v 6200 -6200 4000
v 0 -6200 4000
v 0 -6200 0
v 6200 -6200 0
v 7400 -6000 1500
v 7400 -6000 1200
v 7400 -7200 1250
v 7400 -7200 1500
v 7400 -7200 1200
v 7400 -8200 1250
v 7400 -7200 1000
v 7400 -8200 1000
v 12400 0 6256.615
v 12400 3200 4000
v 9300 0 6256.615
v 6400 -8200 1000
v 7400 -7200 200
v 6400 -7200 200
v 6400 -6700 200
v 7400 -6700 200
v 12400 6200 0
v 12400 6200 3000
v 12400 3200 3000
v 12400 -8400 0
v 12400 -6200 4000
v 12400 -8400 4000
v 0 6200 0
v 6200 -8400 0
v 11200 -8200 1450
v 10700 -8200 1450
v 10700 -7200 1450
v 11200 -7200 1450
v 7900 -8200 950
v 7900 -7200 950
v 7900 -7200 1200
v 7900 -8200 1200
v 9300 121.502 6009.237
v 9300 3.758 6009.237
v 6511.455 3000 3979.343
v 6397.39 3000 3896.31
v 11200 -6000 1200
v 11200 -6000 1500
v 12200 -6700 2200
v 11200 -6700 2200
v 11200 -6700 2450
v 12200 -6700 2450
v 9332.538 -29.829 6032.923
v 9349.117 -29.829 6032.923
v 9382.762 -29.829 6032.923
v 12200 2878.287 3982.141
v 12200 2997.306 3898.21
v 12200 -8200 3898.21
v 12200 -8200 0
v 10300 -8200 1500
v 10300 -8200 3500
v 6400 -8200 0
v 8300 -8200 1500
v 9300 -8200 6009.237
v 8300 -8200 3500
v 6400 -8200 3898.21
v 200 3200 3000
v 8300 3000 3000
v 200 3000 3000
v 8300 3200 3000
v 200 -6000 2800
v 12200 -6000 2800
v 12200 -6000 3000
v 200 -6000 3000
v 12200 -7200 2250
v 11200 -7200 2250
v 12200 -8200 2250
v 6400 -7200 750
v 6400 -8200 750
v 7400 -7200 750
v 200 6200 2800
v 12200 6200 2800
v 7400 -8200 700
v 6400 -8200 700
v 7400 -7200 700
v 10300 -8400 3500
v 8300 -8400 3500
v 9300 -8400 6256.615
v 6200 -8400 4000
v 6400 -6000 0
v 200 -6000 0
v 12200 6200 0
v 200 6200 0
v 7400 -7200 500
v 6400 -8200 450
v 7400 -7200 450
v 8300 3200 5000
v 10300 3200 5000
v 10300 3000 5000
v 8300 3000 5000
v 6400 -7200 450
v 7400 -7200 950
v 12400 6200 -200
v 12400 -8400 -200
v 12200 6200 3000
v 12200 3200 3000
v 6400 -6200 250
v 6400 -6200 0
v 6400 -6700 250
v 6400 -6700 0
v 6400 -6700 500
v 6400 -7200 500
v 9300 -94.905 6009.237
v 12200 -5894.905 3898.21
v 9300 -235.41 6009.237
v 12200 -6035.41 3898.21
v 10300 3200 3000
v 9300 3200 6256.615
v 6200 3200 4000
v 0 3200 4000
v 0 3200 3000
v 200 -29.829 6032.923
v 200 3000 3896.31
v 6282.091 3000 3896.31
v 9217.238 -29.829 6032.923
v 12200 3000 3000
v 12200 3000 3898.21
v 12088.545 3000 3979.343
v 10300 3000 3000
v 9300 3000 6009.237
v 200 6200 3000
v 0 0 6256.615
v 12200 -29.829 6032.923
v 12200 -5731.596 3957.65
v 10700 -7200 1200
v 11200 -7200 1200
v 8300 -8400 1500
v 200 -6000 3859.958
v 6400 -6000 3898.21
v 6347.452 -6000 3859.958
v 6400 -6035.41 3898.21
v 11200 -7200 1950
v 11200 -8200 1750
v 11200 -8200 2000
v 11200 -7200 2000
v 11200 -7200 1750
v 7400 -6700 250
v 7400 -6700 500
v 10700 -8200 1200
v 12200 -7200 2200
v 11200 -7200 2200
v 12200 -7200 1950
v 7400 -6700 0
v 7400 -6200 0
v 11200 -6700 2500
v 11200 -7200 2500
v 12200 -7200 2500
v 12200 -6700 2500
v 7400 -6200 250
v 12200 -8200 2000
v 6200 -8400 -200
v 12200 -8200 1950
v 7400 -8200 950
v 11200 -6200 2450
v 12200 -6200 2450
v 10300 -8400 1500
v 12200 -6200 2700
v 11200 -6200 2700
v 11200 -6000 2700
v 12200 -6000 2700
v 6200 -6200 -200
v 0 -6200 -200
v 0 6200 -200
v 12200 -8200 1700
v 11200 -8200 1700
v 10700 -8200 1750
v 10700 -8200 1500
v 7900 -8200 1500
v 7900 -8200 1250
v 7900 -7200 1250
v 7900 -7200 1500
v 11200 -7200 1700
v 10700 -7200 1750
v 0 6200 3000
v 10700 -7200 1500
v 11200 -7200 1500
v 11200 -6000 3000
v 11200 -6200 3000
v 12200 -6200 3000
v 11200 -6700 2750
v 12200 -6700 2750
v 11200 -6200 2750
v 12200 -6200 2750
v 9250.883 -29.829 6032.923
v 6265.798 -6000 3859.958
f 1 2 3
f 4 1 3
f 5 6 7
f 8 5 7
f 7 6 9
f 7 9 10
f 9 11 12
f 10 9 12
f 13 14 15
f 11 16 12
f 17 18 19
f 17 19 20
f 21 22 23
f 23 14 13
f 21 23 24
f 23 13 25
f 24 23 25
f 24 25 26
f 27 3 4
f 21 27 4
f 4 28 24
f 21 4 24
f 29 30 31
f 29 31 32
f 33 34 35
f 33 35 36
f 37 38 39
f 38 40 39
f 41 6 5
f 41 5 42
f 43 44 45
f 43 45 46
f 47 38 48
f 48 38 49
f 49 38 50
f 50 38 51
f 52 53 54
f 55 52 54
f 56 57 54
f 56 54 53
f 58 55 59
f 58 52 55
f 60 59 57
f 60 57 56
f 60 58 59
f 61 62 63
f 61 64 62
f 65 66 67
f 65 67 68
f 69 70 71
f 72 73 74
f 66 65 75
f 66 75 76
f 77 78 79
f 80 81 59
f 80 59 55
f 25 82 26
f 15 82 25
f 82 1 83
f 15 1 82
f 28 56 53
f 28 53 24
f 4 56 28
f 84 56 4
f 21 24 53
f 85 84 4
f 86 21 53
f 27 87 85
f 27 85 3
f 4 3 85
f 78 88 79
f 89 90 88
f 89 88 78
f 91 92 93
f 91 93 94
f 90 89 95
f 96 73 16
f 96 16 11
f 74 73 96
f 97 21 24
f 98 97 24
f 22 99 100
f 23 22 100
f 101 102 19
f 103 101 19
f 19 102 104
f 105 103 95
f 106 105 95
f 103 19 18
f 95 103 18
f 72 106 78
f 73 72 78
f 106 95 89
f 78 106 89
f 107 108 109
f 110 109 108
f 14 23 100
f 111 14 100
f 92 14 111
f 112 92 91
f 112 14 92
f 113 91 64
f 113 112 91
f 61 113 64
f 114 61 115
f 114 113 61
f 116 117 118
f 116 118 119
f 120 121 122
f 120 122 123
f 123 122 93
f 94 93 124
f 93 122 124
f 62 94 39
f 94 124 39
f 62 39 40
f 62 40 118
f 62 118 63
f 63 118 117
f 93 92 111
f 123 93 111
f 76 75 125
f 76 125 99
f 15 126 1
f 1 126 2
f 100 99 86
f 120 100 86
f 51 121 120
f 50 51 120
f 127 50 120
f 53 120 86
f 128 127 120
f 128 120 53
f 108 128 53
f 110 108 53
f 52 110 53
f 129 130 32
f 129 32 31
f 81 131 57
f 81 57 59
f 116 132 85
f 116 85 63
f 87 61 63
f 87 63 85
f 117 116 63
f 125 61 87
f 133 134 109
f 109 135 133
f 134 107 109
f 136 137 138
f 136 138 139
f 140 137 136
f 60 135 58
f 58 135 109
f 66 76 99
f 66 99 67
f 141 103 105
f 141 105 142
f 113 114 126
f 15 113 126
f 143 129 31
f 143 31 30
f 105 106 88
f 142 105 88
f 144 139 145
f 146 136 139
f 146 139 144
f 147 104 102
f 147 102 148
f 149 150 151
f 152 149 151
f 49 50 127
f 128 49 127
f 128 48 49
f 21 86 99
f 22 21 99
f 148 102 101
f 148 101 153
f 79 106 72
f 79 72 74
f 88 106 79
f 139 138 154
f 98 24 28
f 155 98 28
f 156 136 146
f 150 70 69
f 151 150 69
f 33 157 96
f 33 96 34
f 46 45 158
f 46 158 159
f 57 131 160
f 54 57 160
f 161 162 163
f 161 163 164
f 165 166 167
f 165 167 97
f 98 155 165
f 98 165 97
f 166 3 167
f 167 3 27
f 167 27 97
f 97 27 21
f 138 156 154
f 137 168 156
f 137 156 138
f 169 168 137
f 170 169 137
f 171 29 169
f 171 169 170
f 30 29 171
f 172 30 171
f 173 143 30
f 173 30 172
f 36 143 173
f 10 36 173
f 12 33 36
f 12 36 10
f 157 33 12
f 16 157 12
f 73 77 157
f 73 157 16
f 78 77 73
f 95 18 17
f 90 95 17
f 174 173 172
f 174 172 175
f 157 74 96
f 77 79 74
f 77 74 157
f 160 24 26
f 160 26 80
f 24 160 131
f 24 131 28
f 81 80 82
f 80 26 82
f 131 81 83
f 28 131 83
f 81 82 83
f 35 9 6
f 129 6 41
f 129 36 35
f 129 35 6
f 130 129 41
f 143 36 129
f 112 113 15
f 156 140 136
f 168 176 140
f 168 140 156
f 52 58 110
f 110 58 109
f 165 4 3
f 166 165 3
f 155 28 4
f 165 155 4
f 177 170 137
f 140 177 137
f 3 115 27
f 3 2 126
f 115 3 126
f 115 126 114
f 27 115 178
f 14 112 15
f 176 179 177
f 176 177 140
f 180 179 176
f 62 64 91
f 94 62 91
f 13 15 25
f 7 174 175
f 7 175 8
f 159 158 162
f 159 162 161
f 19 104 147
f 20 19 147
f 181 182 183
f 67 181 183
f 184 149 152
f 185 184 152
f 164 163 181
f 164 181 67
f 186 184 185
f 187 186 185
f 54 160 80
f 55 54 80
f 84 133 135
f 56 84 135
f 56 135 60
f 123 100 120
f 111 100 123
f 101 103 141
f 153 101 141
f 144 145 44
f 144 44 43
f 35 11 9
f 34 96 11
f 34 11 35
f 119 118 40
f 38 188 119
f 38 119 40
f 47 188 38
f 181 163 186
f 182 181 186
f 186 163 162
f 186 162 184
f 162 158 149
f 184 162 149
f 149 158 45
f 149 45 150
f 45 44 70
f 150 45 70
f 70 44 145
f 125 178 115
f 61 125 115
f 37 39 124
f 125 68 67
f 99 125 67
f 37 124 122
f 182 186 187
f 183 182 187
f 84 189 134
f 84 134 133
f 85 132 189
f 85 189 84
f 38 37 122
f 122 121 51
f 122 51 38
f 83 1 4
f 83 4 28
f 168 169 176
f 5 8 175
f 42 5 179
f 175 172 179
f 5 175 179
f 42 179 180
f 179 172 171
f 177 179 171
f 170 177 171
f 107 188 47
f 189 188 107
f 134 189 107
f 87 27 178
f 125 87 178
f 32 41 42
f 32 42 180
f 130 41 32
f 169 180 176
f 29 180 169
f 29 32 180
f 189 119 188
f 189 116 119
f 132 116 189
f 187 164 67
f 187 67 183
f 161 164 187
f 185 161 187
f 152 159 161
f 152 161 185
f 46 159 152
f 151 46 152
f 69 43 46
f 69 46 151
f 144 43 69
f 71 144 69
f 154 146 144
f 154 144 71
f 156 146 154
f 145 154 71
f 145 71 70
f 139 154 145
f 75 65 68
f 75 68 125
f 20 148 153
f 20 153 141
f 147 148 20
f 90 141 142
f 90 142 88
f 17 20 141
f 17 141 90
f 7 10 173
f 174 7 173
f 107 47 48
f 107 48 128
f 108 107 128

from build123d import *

# Parameters (mm, degrees)
F14_DEPTH    = 12400
F15_W        = 2000
F15_H        = 1000
F0_DEPTH     = 11600
F16_DEPTH    = 4000
F1_T         = 200
F1_T3_DEPTH  = 7689.8774544047
F1_T5_DEPTH  = 5394.2279984236
F1_T7_DEPTH  = 5394.2279984236
F1_T9_DEPTH  = 7689.8774544047
F1_T11_DEPTH = 4400
F2_W         = 2000
F2_H         = 2000
F17_DEPTH    = 2400
F18_DEPTH    = 200
F3_W         = 1000
F3_H         = 500
F3_W_2       = 500
F3_H_2       = 1000
F3_H_3       = 200
F4_DEPTH     = 200
F5_START     = -2800
F5_DEPTH     = 200
F6_START     = -1200
F6_DEPTH     = 300
F7_START     = -1450
F7_DEPTH     = 300
F19_START    = -1700
F19_DEPTH    = 300
F20_START    = -1950
F20_DEPTH    = 300
F21_START    = -2200
F21_DEPTH    = 300
F8_START     = -2450
F8_DEPTH     = 300
F22_START    = -2700
F22_DEPTH    = 300
F9_START     = -950
F9_DEPTH     = 300
F10_START    = -700
F10_DEPTH    = 300
F11_START    = -450
F11_DEPTH    = 300
F23_START    = -200
F23_DEPTH    = 300
F12_DEPTH    = 250


# Not quite as in the source:
# - an extrude ends at something that could not be found from the text; its depth is read off the source's solid
# - a shell that OpenCascade refuses in one call is made with other operations: the cavity is built on its own and cut out


with BuildPart() as f14:
    # F13 (on Right) → F14 (new body)
    with BuildSketch(Plane.YZ):
        Polygon((-6200, 0), (6200, 0), (6200, 3000), (3200, 3000), (3200, 4000), (0, 6256.6154524505), (-6200, 4000), align=None)
    extrude(amount=F14_DEPTH)

    # F15 (on face) → F0 (join)
    with BuildSketch(Plane(origin=(0, 3200, 0), x_dir=(-1, 0, 0), z_dir=(0, 1, 0))):
        Polygon((-9300, 6256.6154524505), (-12400, 4000), (-10300, 4000), (-10300, 5000), (-8300, 5000), (-8300, 4000), (-6200, 4000), align=None)
        with Locations((-9300, 4500)):
            Rectangle(F15_W, F15_H)
    extrude(amount=-F0_DEPTH)

    # F16 (add, through all): a face of the model
    f16_faces = [f14.faces().sort_by_distance(p)[0] for p in [
        (9300, -7300, 4000),
    ]]
    extrude(f16_faces, amount=F16_DEPTH)

    # F1: shell of thickness 200, made by hand


with BuildPart() as f1_core1:
    # F1_t2: copy of F14
    add(f14.part)

    # the walls: a layer under each face that stays
    f1_faces = [f1_core1.faces().sort_by_distance(p)[0] for p in [
        (4650, -3100, 5128.3077262252),
        (4650, 1600, 5128.3077262252),
        (10333.3333333333, 3200, 3542.7692420751),
        (9816.6666666667, 1600, 5880.512877042),
        (11883.3333333333, 1600, 5128.3077262252),
        (11883.3333333333, -1033.3333333333, 5880.512877042),
        (10850, -4200, 5128.3077262252),
        (9300, -8400, 3128.3077262252),
        (6200, -7300, 2000),
        (12400, -1100, 3128.3077262252),
        (7750, 2666.6666666667, 5128.3077262252),
        (7750, -4200, 5128.3077262252),
        (3100, -6200, 2000),
        (0, 0, 3128.3077262252),
    ]]
    thicken(f1_faces, amount=-F1_T, mode=Mode.SUBTRACT)

    # F1_s4 → F1_t3 (cut)
    with BuildSketch(Plane(origin=(-679.6785869535, -1359.357173907, -494.7655490384), x_dir=(-0.894427191, 0.4472135955, 0), z_dir=(0.4252472033, 0.8504944066, 0.3095546484))):
        Polygon((-8317.4260033625, 4665.513258174), (-8287.5816646932, 4464.1897106586), (-8360.6155438547, 4452.8857222652), (-8423.4513815758, 4491.7879735735), align=None)
    extrude(amount=F1_T3_DEPTH, mode=Mode.SUBTRACT)

    # F1_s6 → F1_t5 (cut)
    with BuildSketch(Plane(origin=(5462.1086087811, -5638.3056606773, 3976.089899851), x_dir=(-0.7182402228, -0.6957952158, 0), z_dir=(-0.6207165554, 0.6407396701, -0.4518447002))):
        Polygon((-6679.5906506398, 2661.3103147543), (-6599.4357743978, 2474.4492579485), (-6682.2486847174, 2438.2000137734), (-6764.1744994282, 2476.4118797687), align=None)
    extrude(amount=F1_T5_DEPTH, mode=Mode.SUBTRACT)

    # F1_s8 → F1_t7 (cut)
    with BuildSketch(Plane(origin=(5052.5541970253, 5215.5398162841, -3677.9586694679), x_dir=(0.7182402228, -0.6957952158, 0), z_dir=(-0.6207165554, -0.6407396701, 0.4518447002))):
        Polygon((6679.6774932388, 8508.9899951089), (6595.0936444505, 8324.0915601233), (6677.0194591612, 8285.8796941281), (6759.8323694808, 8322.1289383031), align=None)
    extrude(amount=F1_T7_DEPTH, mode=Mode.SUBTRACT)

    # F1_s10 → F1_t9 (cut)
    with BuildSketch(Plane(origin=(773.1141266852, -1546.2282533704, -562.7810596082), x_dir=(0.894427191, 0.4472135955, 0), z_dir=(0.4252472033, -0.8504944066, -0.3095546484))):
        Polygon((8318.9197492359, 7240.4423384247), (8348.7640879052, 7039.1187909094), (8275.7302087437, 7027.8148025159), (8212.8943710226, 7066.7170538243), align=None)
    extrude(amount=F1_T9_DEPTH, mode=Mode.SUBTRACT)

    # F1_s12 → F1_t11 (cut)
    with BuildSketch(Plane.XY.offset(-200)):
        Polygon((6198, -6202), (6400, -6200), (6400, -6000), (6200, -6000), align=None)
    extrude(amount=F1_T11_DEPTH, mode=Mode.SUBTRACT)


with BuildPart() as f14_1:
    add(f14.part)

    # what is left inside the walls is the cavity
    f1_cavity = [f1_core1.part.solids().sort_by_distance(p)[0] for p in [
        (8200, -1000, 2),
    ]]
    add(f1_cavity, mode=Mode.SUBTRACT)

    # F2 (on face) → F17 (cut, through all)
    with BuildSketch(Plane.XZ.offset(8400)):
        with Locations((9300, 2500)):
            Rectangle(F2_W, F2_H)
    extrude(amount=-F17_DEPTH, mode=Mode.SUBTRACT)

    # F15 (on face) → F18 (cut, through all)
    with BuildSketch(Plane(origin=(0, 3200, 0), x_dir=(-1, 0, 0), z_dir=(0, 1, 0))):
        with Locations((-9300, 3500)):
            Rectangle(F15_W, F15_H)
        with Locations((-9300, 4500)):
            Rectangle(F15_W, F15_H)
    extrude(amount=-F18_DEPTH, mode=Mode.SUBTRACT)


with BuildPart() as f4:
    # F3 (on face) → F4 (new body)
    with BuildSketch(Plane(origin=(0, 0, 0), x_dir=(1, 0, 0), z_dir=(0, 0, -1))):
        Polygon((200, 6000), (6400, 6000), (6400, 6200), (6400, 6700), (6400, 7200), (6400, 8200), (7400, 8200), (7900, 8200), (10700, 8200), (11200, 8200), (12200, 8200), (12200, 7200), (12200, 6700), (12200, 6200), (12200, 6000), (12200, -6200), (12400, -6200), (12400, 8400), (6200, 8400), (6200, 6200), (0, 6200), (0, -6200), (200, -6200), align=None)
        Polygon((7400, 6000), (6400, 6000), (200, 6000), (200, -6200), (12200, -6200), (12200, 6000), (11200, 6000), align=None)
        Polygon((6400, 8200), (6400, 7200), (7400, 7200), align=None)
        with Locations((6900, 6950)):
            Rectangle(F3_W, F3_H)
        Polygon((7400, 8200), (6400, 8200), (7400, 7200), align=None)
        with Locations((7650, 7700)):
            Rectangle(F3_W_2, F3_H_2)
        Polygon((7400, 6200), (7400, 6000), (11200, 6000), (11200, 6200), (11200, 6700), (11200, 7200), (10700, 7200), (10700, 8200), (7900, 8200), (7900, 7200), (7400, 7200), (7400, 6700), align=None)
        with Locations((6900, 6450)):
            Rectangle(F3_W, F3_H)
        with Locations((6900, 6100)):
            Rectangle(F3_W, F3_H_3)
        with Locations((11700, 6100)):
            Rectangle(F3_W, F3_H_3)
        with Locations((11700, 6450)):
            Rectangle(F3_W, F3_H)
        with Locations((11700, 6950)):
            Rectangle(F3_W, F3_H)
        Polygon((12200, 8200), (11200, 7200), (12200, 7200), align=None)
        Polygon((11200, 8200), (11200, 7200), (12200, 8200), align=None)
        with Locations((10950, 7700)):
            Rectangle(F3_W_2, F3_H_2)
    extrude(amount=F4_DEPTH)


with BuildPart() as f5:
    # F3 (on face) → F5 (new body)
    with BuildSketch(Plane(origin=(0, 0, 0), x_dir=(1, 0, 0), z_dir=(0, 0, -1)).offset(F5_START)):
        Polygon((7400, 6000), (6400, 6000), (200, 6000), (200, -6200), (12200, -6200), (12200, 6000), (11200, 6000), align=None)
    extrude(amount=-F5_DEPTH)


with BuildPart() as f6:
    # F3 (on face) → F6 (new body)
    with BuildSketch(Plane(origin=(0, 0, 0), x_dir=(1, 0, 0), z_dir=(0, 0, -1)).offset(F6_START)):
        Polygon((7400, 6200), (7400, 6000), (11200, 6000), (11200, 6200), (11200, 6700), (11200, 7200), (10700, 7200), (10700, 8200), (7900, 8200), (7900, 7200), (7400, 7200), (7400, 6700), align=None)
    extrude(amount=-F6_DEPTH)

    # F3 (on face) → F7 (join)
    with BuildSketch(Plane(origin=(0, 0, 0), x_dir=(1, 0, 0), z_dir=(0, 0, -1)).offset(F7_START)):
        with Locations((10950, 7700)):
            Rectangle(F3_W_2, F3_H_2)
    extrude(amount=-F7_DEPTH)

    # F3 (on face) → F19 (join)
    with BuildSketch(Plane(origin=(0, 0, 0), x_dir=(1, 0, 0), z_dir=(0, 0, -1)).offset(F19_START)):
        Polygon((11200, 8200), (11200, 7200), (12200, 8200), align=None)
    extrude(amount=-F19_DEPTH)

    # F3 (on face) → F20 (join)
    with BuildSketch(Plane(origin=(0, 0, 0), x_dir=(1, 0, 0), z_dir=(0, 0, -1)).offset(F20_START)):
        Polygon((12200, 8200), (11200, 7200), (12200, 7200), align=None)
    extrude(amount=-F20_DEPTH)

    # F3 (on face) → F21 (join)
    with BuildSketch(Plane(origin=(0, 0, 0), x_dir=(1, 0, 0), z_dir=(0, 0, -1)).offset(F21_START)):
        with Locations((11700, 6950)):
            Rectangle(F3_W, F3_H)
    extrude(amount=-F21_DEPTH)

    # F3 (on face) → F8 (join)
    with BuildSketch(Plane(origin=(0, 0, 0), x_dir=(1, 0, 0), z_dir=(0, 0, -1)).offset(F8_START)):
        with Locations((11700, 6450)):
            Rectangle(F3_W, F3_H)
    extrude(amount=-F8_DEPTH)

    # F3 (on face) → F22 (join)
    with BuildSketch(Plane(origin=(0, 0, 0), x_dir=(1, 0, 0), z_dir=(0, 0, -1)).offset(F22_START)):
        with Locations((11700, 6100)):
            Rectangle(F3_W, F3_H_3)
    extrude(amount=-F22_DEPTH)

    # F3 (on face) → F9 (join)
    with BuildSketch(Plane(origin=(0, 0, 0), x_dir=(1, 0, 0), z_dir=(0, 0, -1)).offset(F9_START)):
        with Locations((7650, 7700)):
            Rectangle(F3_W_2, F3_H_2)
    extrude(amount=-F9_DEPTH)

    # F3 (on face) → F10 (join)
    with BuildSketch(Plane(origin=(0, 0, 0), x_dir=(1, 0, 0), z_dir=(0, 0, -1)).offset(F10_START)):
        Polygon((7400, 8200), (6400, 8200), (7400, 7200), align=None)
    extrude(amount=-F10_DEPTH)

    # F3 (on face) → F11 (join)
    with BuildSketch(Plane(origin=(0, 0, 0), x_dir=(1, 0, 0), z_dir=(0, 0, -1)).offset(F11_START)):
        Polygon((6400, 8200), (6400, 7200), (7400, 7200), align=None)
    extrude(amount=-F11_DEPTH)

    # F3 (on face) → F23 (join)
    with BuildSketch(Plane(origin=(0, 0, 0), x_dir=(1, 0, 0), z_dir=(0, 0, -1)).offset(F23_START)):
        with Locations((6900, 6950)):
            Rectangle(F3_W, F3_H)
    extrude(amount=-F23_DEPTH)

    # F3 (on face) → F12 (join)
    with BuildSketch(Plane(origin=(0, 0, 0), x_dir=(1, 0, 0), z_dir=(0, 0, -1))):
        with Locations((6900, 6450)):
            Rectangle(F3_W, F3_H)
    extrude(amount=-F12_DEPTH)


solid = Compound([f14_1.part, f4.part, f5.part, f6.part])
